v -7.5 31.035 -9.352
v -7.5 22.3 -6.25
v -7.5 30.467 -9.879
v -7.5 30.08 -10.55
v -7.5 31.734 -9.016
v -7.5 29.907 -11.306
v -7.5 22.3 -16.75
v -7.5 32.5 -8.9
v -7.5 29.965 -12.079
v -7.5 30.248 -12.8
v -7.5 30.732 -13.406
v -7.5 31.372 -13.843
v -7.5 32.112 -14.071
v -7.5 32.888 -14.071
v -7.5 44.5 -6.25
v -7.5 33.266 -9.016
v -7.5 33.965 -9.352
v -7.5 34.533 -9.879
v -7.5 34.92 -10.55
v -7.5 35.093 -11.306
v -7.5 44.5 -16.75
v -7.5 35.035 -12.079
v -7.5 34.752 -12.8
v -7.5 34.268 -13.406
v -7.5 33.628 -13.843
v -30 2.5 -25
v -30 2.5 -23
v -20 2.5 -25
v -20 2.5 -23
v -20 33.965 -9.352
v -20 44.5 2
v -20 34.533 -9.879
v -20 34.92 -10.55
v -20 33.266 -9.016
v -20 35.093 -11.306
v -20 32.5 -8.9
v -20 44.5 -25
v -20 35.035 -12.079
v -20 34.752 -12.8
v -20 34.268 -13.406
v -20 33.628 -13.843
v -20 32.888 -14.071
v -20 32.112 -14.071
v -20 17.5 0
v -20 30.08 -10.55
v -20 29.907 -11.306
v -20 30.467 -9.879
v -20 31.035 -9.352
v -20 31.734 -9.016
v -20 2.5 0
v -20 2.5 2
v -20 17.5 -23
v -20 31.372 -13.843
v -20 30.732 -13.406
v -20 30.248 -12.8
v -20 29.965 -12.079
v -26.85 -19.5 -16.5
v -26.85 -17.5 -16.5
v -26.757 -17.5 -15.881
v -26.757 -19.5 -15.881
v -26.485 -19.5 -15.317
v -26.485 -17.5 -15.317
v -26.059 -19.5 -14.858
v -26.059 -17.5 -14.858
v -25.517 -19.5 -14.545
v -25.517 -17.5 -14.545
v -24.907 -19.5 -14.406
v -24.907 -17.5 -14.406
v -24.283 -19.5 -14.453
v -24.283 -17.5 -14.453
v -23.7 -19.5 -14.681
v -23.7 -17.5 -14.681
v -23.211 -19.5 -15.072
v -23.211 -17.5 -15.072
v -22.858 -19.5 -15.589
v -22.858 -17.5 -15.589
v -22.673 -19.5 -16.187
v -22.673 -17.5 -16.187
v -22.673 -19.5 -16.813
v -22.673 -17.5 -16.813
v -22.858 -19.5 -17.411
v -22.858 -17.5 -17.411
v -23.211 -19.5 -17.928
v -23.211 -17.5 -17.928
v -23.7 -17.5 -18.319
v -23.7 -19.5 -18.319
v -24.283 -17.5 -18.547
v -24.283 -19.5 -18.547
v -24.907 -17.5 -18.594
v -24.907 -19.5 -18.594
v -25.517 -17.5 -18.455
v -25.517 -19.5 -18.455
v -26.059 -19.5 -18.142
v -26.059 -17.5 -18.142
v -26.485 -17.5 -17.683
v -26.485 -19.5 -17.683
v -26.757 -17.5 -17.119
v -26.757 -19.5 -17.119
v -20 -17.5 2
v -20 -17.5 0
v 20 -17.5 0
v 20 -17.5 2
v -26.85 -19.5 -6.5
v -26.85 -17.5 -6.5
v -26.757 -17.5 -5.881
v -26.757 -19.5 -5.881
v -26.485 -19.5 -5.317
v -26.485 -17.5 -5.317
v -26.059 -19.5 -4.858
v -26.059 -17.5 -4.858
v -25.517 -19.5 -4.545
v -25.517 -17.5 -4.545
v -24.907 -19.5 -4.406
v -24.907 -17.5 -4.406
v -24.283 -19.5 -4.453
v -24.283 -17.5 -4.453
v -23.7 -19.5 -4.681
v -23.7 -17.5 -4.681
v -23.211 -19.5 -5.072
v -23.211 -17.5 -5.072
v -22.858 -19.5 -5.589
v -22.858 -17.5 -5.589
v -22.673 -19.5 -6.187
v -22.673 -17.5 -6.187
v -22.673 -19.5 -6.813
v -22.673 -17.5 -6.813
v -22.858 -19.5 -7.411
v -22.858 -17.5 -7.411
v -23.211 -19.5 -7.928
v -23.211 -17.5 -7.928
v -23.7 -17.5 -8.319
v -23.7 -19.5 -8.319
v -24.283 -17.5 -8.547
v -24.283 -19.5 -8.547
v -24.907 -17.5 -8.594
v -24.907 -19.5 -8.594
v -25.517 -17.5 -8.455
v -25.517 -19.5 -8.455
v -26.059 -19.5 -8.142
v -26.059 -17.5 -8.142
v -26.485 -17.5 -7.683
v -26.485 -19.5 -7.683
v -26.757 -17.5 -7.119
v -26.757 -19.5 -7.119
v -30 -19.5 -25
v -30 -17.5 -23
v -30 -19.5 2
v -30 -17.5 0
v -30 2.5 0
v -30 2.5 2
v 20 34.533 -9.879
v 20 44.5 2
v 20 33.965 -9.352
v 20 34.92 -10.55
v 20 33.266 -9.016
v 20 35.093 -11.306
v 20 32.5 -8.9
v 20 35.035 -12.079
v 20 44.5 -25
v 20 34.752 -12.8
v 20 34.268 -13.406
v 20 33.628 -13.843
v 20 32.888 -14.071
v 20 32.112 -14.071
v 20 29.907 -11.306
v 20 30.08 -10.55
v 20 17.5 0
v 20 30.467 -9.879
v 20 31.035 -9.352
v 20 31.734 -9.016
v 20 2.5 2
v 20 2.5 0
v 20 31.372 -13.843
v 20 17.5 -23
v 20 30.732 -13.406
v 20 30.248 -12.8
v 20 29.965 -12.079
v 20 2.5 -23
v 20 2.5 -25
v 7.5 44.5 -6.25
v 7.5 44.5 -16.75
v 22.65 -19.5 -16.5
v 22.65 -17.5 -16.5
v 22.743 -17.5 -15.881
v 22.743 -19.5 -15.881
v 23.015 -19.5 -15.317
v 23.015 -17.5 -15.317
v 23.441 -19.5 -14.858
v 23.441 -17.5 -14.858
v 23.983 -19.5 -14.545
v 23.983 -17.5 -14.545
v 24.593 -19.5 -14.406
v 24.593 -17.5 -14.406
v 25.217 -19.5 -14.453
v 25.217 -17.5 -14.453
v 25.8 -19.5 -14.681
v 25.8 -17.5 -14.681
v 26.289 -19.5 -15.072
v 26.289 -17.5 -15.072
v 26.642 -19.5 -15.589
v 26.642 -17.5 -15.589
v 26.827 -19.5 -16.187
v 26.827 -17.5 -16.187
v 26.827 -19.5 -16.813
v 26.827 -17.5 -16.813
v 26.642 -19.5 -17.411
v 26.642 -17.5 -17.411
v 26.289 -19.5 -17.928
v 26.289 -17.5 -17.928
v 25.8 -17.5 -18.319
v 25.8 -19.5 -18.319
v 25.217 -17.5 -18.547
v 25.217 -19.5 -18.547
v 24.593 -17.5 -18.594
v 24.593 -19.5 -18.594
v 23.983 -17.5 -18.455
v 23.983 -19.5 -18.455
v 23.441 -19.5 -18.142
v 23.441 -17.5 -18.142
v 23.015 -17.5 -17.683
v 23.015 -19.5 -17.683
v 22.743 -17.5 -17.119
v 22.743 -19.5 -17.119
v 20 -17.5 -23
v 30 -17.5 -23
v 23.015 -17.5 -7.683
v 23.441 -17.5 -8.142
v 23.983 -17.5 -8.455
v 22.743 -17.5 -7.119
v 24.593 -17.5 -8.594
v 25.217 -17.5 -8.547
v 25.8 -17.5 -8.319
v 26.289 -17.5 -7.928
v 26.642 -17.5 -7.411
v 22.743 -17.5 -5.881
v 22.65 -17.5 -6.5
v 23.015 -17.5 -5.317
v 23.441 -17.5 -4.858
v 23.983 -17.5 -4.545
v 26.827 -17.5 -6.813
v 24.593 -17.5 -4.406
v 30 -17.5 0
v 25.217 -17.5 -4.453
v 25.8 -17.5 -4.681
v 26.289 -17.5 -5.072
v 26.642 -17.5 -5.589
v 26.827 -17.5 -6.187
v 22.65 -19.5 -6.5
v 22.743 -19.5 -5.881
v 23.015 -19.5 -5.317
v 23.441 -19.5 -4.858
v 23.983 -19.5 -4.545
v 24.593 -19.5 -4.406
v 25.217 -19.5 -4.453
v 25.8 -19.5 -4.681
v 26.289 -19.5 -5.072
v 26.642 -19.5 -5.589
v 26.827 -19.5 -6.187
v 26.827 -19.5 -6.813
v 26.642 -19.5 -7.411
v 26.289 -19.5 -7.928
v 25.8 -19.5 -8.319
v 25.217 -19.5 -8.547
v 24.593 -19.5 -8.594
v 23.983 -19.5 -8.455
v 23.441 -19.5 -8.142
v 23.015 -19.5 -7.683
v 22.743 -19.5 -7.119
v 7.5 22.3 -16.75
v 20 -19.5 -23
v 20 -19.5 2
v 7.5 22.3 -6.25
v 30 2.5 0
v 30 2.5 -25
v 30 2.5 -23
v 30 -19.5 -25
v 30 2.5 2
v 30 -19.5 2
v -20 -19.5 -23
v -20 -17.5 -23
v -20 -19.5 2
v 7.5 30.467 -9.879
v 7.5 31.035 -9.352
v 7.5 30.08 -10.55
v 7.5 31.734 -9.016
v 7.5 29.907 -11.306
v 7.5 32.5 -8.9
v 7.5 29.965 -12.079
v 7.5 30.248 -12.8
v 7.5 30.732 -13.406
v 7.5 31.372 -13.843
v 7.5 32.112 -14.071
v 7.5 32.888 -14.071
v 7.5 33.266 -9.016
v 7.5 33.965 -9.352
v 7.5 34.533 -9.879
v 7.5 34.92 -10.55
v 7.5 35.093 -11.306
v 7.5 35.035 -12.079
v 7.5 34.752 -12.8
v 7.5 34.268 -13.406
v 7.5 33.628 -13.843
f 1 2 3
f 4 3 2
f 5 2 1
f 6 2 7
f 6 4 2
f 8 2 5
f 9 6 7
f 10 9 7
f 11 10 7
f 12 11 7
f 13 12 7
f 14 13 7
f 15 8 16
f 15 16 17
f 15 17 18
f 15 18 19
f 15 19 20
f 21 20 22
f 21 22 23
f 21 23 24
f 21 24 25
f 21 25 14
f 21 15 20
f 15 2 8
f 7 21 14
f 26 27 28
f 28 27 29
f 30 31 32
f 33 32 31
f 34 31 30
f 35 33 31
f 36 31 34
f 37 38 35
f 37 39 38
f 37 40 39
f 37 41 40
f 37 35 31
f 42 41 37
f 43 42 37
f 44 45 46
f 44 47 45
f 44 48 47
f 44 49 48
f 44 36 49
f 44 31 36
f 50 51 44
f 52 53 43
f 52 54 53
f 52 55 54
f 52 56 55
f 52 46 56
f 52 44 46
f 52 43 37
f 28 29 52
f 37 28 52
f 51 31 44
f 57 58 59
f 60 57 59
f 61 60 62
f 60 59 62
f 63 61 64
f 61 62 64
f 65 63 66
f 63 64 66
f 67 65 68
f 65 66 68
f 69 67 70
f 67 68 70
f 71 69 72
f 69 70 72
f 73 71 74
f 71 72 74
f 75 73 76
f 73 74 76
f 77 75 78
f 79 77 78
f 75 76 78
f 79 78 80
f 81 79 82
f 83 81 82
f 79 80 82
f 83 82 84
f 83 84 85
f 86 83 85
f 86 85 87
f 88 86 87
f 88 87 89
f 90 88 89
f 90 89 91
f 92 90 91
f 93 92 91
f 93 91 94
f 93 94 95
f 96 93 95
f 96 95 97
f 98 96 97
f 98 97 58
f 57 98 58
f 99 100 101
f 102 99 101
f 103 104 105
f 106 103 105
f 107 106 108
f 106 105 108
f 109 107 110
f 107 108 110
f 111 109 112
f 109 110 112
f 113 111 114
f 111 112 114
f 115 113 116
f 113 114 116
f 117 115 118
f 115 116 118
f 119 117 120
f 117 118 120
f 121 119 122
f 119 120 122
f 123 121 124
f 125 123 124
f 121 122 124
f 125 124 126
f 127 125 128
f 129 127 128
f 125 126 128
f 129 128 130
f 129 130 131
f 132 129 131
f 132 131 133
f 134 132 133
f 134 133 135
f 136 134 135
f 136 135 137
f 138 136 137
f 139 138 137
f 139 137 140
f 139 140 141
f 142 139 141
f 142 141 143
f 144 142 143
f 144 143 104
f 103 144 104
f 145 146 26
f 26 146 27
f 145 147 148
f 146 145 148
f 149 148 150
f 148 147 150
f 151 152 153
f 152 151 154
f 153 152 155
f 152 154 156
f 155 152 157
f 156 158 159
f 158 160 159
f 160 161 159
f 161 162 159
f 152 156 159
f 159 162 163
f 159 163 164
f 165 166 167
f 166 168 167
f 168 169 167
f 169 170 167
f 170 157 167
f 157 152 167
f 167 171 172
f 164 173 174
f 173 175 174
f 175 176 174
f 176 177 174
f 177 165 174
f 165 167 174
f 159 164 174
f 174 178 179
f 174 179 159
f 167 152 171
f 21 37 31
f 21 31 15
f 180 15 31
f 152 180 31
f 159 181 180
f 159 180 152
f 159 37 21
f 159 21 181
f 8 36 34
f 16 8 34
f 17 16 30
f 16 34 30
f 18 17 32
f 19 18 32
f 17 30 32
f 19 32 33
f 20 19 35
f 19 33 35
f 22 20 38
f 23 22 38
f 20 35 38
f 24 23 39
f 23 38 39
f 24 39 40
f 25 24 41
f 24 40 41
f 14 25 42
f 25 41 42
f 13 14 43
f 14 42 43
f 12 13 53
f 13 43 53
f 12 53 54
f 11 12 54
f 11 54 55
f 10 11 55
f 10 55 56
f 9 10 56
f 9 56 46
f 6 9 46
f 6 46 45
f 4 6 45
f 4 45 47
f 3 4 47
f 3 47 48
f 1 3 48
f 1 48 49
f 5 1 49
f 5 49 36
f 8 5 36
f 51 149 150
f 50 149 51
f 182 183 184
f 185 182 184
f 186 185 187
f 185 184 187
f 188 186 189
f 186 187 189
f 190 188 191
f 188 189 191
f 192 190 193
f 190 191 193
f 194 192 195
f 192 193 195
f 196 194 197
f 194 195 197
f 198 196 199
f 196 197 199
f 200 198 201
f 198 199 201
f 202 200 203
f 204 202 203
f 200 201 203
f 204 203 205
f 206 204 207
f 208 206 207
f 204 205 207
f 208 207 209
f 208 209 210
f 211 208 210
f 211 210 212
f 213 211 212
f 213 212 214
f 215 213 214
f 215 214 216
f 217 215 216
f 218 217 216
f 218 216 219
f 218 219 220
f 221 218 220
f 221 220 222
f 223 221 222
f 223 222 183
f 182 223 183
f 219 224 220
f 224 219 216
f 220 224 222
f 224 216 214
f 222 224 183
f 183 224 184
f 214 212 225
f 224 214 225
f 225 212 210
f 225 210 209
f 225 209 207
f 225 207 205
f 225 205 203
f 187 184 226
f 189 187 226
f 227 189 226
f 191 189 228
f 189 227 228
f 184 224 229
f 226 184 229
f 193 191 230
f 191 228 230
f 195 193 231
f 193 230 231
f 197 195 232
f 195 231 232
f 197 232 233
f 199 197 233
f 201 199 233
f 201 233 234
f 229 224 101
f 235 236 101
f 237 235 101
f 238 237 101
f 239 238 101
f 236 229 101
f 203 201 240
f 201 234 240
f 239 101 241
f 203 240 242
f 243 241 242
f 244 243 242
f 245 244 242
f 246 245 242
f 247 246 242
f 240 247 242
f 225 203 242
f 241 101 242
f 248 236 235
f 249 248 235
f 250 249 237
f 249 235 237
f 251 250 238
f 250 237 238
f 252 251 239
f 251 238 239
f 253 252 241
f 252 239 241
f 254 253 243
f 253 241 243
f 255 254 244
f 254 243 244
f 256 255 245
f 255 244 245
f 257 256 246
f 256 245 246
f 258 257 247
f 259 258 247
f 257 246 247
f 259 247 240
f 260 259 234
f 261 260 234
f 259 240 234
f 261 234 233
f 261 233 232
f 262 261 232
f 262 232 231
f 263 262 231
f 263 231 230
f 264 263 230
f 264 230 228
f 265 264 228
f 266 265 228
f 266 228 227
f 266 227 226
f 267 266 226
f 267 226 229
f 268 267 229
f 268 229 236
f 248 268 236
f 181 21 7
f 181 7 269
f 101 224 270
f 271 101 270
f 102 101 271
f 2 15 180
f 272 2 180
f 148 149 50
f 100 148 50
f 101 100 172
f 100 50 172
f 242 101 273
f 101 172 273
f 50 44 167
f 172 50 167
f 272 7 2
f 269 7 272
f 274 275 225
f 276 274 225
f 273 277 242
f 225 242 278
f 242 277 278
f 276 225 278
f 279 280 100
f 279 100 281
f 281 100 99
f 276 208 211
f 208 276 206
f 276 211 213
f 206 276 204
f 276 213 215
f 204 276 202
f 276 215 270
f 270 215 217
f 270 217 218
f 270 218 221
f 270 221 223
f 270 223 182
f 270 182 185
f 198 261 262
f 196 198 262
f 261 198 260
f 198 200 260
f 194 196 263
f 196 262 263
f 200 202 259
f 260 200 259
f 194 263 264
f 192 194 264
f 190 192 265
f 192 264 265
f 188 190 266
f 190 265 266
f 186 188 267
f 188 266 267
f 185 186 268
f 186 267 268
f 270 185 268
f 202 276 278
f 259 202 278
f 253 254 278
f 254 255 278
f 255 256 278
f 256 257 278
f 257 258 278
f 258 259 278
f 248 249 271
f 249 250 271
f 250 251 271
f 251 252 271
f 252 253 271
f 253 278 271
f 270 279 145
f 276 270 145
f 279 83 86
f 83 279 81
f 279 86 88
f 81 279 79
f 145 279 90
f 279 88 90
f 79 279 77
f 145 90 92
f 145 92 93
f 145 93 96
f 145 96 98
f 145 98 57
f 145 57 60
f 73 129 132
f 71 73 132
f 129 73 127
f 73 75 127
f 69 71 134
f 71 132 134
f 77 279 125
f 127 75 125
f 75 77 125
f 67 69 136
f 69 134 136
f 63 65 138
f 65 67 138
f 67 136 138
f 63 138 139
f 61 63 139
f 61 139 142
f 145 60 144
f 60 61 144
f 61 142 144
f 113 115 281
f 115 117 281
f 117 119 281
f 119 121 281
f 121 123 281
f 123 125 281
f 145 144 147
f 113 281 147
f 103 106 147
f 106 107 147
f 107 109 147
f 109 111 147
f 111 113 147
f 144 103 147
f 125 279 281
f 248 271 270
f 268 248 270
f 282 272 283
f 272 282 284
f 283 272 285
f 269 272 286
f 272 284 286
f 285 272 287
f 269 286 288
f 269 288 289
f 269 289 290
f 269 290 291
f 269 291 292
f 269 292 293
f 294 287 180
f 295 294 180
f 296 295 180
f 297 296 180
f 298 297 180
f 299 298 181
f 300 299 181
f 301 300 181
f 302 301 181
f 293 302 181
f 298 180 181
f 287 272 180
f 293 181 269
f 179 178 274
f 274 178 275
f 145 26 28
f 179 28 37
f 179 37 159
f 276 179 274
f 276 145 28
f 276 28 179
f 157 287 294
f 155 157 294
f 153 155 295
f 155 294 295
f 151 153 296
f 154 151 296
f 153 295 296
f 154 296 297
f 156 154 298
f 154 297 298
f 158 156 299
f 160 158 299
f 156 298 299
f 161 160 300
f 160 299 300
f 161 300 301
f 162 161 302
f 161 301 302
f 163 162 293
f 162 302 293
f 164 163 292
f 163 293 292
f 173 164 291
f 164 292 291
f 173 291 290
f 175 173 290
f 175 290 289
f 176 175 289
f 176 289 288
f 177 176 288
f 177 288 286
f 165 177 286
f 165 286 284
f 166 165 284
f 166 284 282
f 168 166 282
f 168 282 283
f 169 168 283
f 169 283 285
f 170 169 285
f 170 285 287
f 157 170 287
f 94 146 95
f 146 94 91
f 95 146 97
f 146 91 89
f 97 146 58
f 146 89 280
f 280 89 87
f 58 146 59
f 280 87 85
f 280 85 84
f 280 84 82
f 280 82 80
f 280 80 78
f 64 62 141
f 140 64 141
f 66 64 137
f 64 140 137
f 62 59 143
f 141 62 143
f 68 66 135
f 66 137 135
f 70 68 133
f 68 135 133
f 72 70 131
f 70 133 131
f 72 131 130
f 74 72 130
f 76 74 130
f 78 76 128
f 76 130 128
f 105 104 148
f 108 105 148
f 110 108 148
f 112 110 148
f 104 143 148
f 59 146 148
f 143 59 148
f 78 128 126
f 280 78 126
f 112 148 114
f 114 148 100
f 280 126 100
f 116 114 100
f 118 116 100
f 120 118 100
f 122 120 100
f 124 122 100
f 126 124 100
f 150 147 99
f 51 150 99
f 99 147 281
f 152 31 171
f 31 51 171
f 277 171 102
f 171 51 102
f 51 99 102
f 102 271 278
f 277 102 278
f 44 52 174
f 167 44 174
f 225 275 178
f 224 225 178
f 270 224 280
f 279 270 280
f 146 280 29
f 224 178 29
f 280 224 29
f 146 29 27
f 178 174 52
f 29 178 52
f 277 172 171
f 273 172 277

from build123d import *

# Parameters (mm, degrees)
SKETCH_1_W          = 10
SKETCH_1_H          = 20
SKETCH_1_W_2        = 40
SKETCH_1_H_2        = 35
EXTRUDE_1_DEPTH     = 2
SKETCH_3_W          = 10
SKETCH_3_H          = 25
EXTRUDE_2_DEPTH     = 2
EXTRUDE_3_DEPTH     = 2
CUT_EXTRUDE_1_REACH = 54.44
SKETCH_5_R          = 2.1
EXTRUDE_5_DEPTH     = 2
SKETCH_7_W          = 40
SKETCH_7_H          = 27
EXTRUDE_6_DEPTH     = 25
CUT_EXTRUDE_2_REACH = 73.451
SKETCH_8_R          = 2.6
SKETCH_9_W          = 15
SKETCH_9_H          = 10.5
CUT_EXTRUDE_3_DEPTH = 22.2


with BuildPart() as part:
    # 草图1 → 凸台-拉伸1 (new body)
    with BuildSketch(Plane.XY):
        with Locations((-25, -7.5)):
            Rectangle(SKETCH_1_W, SKETCH_1_H)
        Rectangle(SKETCH_1_W_2, SKETCH_1_H_2)
        with Locations((25, -7.5)):
            Rectangle(SKETCH_1_W, SKETCH_1_H)
    extrude(amount=EXTRUDE_1_DEPTH)

    # 草图3 → 凸台-拉伸2 (add)
    with BuildSketch(Plane.XZ.offset(17.5)):
        with Locations((-25, -10.5)):
            Rectangle(SKETCH_3_W, SKETCH_3_H)
        with Locations((25, -10.5)):
            Rectangle(SKETCH_3_W, SKETCH_3_H)
    extrude(amount=EXTRUDE_2_DEPTH)

    # 草图4 → 凸台-拉伸3 (add)
    with BuildSketch(Plane(origin=(0, 0, -23), x_dir=(-1, 0, 0), z_dir=(0, 0, -1))):
        Polygon((30, -19.5), (30, -17.5), (30, 2.5), (20, 2.5), (20, 17.5), (-20, 17.5), (-20, 2.5), (-30, 2.5), (-30, -17.5), (-30, -19.5), align=None)
    extrude(amount=EXTRUDE_3_DEPTH)

    # 草图5 → 切除-拉伸1 (cut, up to next)
    with BuildSketch(Plane(origin=(0, -17.5, 0), x_dir=(1, 0, 0), z_dir=(0, 1, 0)), mode=Mode.PRIVATE) as cut_extrude_1_sk1:
        with Locations(Location((24.75, 16.5, 0), (0, 0, 180))):
            Circle(SKETCH_5_R)
    cut_extrude_1_tool1 = extrude(cut_extrude_1_sk1.sketch, amount=-CUT_EXTRUDE_1_REACH, mode=Mode.PRIVATE) & part.part
    # 草图5 → 切除-拉伸1 (cut, up to next)
    with BuildSketch(Plane(origin=(0, -17.5, 0), x_dir=(1, 0, 0), z_dir=(0, 1, 0)), mode=Mode.PRIVATE) as cut_extrude_1_sk2:
        with Locations(Location((24.75, 6.5, 0), (0, 0, 180))):
            Circle(SKETCH_5_R)
    cut_extrude_1_tool2 = extrude(cut_extrude_1_sk2.sketch, amount=-CUT_EXTRUDE_1_REACH, mode=Mode.PRIVATE) & part.part
    # 草图5 → 切除-拉伸1 (cut, up to next)
    with BuildSketch(Plane(origin=(0, -17.5, 0), x_dir=(1, 0, 0), z_dir=(0, 1, 0)), mode=Mode.PRIVATE) as cut_extrude_1_sk3:
        with Locations(Location((-24.75, 16.5, 0), (0, 0, 180))):
            Circle(SKETCH_5_R)
    cut_extrude_1_tool3 = extrude(cut_extrude_1_sk3.sketch, amount=-CUT_EXTRUDE_1_REACH, mode=Mode.PRIVATE) & part.part
    # 草图5 → 切除-拉伸1 (cut, up to next)
    with BuildSketch(Plane(origin=(0, -17.5, 0), x_dir=(1, 0, 0), z_dir=(0, 1, 0)), mode=Mode.PRIVATE) as cut_extrude_1_sk4:
        with Locations(Location((-24.75, 6.5, 0), (0, 0, 180))):
            Circle(SKETCH_5_R)
    cut_extrude_1_tool4 = extrude(cut_extrude_1_sk4.sketch, amount=-CUT_EXTRUDE_1_REACH, mode=Mode.PRIVATE) & part.part
    add(cut_extrude_1_tool1.solids().sort_by_distance((24.75, -17.5, -16.5))[0], mode=Mode.SUBTRACT)
    add(cut_extrude_1_tool2.solids().sort_by_distance((24.75, -17.5, -6.5))[0], mode=Mode.SUBTRACT)
    add(cut_extrude_1_tool3.solids().sort_by_distance((-24.75, -17.5, -16.5))[0], mode=Mode.SUBTRACT)
    add(cut_extrude_1_tool4.solids().sort_by_distance((-24.75, -17.5, -6.5))[0], mode=Mode.SUBTRACT)

    # 草图6 → 凸台-拉伸5 (add)
    with BuildSketch(Plane(origin=(0, 17.5, 0), x_dir=(1, 0, 0), z_dir=(0, 1, 0))):
        Polygon((-20, 0), (-20, -2), (20, -2), (20, 0), (20, 23), (20, 25), (-20, 25), (-20, 23), align=None)
    extrude(amount=EXTRUDE_5_DEPTH)

    # 草图7 → 凸台-拉伸6 (add)
    with BuildSketch(Plane(origin=(0, 19.5, 0), x_dir=(1, 0, 0), z_dir=(0, 1, 0))):
        with Locations((0, 11.5)):
            Rectangle(SKETCH_7_W, SKETCH_7_H)
    extrude(amount=EXTRUDE_6_DEPTH)

    # 草图8 → 切除-拉伸2 (cut, up to next)
    with BuildSketch(Plane.ZY.offset(20), mode=Mode.PRIVATE) as cut_extrude_2_sk1:
        with Locations((-11.5, 32.5)):
            Circle(SKETCH_8_R)
    cut_extrude_2_tool1 = extrude(cut_extrude_2_sk1.sketch, amount=-CUT_EXTRUDE_2_REACH, mode=Mode.PRIVATE) & part.part
    add(cut_extrude_2_tool1.solids().sort_by_distance((-20, 32.5, -11.5))[0], mode=Mode.SUBTRACT)

    # 草图9 → 切除-拉伸3 (cut)
    with BuildSketch(Plane(origin=(0, 44.5, 0), x_dir=(1, 0, 0), z_dir=(0, 1, 0))):
        with Locations((0, 11.5)):
            Rectangle(SKETCH_9_W, SKETCH_9_H)
    extrude(amount=-CUT_EXTRUDE_3_DEPTH, mode=Mode.SUBTRACT)


solid = part.part
